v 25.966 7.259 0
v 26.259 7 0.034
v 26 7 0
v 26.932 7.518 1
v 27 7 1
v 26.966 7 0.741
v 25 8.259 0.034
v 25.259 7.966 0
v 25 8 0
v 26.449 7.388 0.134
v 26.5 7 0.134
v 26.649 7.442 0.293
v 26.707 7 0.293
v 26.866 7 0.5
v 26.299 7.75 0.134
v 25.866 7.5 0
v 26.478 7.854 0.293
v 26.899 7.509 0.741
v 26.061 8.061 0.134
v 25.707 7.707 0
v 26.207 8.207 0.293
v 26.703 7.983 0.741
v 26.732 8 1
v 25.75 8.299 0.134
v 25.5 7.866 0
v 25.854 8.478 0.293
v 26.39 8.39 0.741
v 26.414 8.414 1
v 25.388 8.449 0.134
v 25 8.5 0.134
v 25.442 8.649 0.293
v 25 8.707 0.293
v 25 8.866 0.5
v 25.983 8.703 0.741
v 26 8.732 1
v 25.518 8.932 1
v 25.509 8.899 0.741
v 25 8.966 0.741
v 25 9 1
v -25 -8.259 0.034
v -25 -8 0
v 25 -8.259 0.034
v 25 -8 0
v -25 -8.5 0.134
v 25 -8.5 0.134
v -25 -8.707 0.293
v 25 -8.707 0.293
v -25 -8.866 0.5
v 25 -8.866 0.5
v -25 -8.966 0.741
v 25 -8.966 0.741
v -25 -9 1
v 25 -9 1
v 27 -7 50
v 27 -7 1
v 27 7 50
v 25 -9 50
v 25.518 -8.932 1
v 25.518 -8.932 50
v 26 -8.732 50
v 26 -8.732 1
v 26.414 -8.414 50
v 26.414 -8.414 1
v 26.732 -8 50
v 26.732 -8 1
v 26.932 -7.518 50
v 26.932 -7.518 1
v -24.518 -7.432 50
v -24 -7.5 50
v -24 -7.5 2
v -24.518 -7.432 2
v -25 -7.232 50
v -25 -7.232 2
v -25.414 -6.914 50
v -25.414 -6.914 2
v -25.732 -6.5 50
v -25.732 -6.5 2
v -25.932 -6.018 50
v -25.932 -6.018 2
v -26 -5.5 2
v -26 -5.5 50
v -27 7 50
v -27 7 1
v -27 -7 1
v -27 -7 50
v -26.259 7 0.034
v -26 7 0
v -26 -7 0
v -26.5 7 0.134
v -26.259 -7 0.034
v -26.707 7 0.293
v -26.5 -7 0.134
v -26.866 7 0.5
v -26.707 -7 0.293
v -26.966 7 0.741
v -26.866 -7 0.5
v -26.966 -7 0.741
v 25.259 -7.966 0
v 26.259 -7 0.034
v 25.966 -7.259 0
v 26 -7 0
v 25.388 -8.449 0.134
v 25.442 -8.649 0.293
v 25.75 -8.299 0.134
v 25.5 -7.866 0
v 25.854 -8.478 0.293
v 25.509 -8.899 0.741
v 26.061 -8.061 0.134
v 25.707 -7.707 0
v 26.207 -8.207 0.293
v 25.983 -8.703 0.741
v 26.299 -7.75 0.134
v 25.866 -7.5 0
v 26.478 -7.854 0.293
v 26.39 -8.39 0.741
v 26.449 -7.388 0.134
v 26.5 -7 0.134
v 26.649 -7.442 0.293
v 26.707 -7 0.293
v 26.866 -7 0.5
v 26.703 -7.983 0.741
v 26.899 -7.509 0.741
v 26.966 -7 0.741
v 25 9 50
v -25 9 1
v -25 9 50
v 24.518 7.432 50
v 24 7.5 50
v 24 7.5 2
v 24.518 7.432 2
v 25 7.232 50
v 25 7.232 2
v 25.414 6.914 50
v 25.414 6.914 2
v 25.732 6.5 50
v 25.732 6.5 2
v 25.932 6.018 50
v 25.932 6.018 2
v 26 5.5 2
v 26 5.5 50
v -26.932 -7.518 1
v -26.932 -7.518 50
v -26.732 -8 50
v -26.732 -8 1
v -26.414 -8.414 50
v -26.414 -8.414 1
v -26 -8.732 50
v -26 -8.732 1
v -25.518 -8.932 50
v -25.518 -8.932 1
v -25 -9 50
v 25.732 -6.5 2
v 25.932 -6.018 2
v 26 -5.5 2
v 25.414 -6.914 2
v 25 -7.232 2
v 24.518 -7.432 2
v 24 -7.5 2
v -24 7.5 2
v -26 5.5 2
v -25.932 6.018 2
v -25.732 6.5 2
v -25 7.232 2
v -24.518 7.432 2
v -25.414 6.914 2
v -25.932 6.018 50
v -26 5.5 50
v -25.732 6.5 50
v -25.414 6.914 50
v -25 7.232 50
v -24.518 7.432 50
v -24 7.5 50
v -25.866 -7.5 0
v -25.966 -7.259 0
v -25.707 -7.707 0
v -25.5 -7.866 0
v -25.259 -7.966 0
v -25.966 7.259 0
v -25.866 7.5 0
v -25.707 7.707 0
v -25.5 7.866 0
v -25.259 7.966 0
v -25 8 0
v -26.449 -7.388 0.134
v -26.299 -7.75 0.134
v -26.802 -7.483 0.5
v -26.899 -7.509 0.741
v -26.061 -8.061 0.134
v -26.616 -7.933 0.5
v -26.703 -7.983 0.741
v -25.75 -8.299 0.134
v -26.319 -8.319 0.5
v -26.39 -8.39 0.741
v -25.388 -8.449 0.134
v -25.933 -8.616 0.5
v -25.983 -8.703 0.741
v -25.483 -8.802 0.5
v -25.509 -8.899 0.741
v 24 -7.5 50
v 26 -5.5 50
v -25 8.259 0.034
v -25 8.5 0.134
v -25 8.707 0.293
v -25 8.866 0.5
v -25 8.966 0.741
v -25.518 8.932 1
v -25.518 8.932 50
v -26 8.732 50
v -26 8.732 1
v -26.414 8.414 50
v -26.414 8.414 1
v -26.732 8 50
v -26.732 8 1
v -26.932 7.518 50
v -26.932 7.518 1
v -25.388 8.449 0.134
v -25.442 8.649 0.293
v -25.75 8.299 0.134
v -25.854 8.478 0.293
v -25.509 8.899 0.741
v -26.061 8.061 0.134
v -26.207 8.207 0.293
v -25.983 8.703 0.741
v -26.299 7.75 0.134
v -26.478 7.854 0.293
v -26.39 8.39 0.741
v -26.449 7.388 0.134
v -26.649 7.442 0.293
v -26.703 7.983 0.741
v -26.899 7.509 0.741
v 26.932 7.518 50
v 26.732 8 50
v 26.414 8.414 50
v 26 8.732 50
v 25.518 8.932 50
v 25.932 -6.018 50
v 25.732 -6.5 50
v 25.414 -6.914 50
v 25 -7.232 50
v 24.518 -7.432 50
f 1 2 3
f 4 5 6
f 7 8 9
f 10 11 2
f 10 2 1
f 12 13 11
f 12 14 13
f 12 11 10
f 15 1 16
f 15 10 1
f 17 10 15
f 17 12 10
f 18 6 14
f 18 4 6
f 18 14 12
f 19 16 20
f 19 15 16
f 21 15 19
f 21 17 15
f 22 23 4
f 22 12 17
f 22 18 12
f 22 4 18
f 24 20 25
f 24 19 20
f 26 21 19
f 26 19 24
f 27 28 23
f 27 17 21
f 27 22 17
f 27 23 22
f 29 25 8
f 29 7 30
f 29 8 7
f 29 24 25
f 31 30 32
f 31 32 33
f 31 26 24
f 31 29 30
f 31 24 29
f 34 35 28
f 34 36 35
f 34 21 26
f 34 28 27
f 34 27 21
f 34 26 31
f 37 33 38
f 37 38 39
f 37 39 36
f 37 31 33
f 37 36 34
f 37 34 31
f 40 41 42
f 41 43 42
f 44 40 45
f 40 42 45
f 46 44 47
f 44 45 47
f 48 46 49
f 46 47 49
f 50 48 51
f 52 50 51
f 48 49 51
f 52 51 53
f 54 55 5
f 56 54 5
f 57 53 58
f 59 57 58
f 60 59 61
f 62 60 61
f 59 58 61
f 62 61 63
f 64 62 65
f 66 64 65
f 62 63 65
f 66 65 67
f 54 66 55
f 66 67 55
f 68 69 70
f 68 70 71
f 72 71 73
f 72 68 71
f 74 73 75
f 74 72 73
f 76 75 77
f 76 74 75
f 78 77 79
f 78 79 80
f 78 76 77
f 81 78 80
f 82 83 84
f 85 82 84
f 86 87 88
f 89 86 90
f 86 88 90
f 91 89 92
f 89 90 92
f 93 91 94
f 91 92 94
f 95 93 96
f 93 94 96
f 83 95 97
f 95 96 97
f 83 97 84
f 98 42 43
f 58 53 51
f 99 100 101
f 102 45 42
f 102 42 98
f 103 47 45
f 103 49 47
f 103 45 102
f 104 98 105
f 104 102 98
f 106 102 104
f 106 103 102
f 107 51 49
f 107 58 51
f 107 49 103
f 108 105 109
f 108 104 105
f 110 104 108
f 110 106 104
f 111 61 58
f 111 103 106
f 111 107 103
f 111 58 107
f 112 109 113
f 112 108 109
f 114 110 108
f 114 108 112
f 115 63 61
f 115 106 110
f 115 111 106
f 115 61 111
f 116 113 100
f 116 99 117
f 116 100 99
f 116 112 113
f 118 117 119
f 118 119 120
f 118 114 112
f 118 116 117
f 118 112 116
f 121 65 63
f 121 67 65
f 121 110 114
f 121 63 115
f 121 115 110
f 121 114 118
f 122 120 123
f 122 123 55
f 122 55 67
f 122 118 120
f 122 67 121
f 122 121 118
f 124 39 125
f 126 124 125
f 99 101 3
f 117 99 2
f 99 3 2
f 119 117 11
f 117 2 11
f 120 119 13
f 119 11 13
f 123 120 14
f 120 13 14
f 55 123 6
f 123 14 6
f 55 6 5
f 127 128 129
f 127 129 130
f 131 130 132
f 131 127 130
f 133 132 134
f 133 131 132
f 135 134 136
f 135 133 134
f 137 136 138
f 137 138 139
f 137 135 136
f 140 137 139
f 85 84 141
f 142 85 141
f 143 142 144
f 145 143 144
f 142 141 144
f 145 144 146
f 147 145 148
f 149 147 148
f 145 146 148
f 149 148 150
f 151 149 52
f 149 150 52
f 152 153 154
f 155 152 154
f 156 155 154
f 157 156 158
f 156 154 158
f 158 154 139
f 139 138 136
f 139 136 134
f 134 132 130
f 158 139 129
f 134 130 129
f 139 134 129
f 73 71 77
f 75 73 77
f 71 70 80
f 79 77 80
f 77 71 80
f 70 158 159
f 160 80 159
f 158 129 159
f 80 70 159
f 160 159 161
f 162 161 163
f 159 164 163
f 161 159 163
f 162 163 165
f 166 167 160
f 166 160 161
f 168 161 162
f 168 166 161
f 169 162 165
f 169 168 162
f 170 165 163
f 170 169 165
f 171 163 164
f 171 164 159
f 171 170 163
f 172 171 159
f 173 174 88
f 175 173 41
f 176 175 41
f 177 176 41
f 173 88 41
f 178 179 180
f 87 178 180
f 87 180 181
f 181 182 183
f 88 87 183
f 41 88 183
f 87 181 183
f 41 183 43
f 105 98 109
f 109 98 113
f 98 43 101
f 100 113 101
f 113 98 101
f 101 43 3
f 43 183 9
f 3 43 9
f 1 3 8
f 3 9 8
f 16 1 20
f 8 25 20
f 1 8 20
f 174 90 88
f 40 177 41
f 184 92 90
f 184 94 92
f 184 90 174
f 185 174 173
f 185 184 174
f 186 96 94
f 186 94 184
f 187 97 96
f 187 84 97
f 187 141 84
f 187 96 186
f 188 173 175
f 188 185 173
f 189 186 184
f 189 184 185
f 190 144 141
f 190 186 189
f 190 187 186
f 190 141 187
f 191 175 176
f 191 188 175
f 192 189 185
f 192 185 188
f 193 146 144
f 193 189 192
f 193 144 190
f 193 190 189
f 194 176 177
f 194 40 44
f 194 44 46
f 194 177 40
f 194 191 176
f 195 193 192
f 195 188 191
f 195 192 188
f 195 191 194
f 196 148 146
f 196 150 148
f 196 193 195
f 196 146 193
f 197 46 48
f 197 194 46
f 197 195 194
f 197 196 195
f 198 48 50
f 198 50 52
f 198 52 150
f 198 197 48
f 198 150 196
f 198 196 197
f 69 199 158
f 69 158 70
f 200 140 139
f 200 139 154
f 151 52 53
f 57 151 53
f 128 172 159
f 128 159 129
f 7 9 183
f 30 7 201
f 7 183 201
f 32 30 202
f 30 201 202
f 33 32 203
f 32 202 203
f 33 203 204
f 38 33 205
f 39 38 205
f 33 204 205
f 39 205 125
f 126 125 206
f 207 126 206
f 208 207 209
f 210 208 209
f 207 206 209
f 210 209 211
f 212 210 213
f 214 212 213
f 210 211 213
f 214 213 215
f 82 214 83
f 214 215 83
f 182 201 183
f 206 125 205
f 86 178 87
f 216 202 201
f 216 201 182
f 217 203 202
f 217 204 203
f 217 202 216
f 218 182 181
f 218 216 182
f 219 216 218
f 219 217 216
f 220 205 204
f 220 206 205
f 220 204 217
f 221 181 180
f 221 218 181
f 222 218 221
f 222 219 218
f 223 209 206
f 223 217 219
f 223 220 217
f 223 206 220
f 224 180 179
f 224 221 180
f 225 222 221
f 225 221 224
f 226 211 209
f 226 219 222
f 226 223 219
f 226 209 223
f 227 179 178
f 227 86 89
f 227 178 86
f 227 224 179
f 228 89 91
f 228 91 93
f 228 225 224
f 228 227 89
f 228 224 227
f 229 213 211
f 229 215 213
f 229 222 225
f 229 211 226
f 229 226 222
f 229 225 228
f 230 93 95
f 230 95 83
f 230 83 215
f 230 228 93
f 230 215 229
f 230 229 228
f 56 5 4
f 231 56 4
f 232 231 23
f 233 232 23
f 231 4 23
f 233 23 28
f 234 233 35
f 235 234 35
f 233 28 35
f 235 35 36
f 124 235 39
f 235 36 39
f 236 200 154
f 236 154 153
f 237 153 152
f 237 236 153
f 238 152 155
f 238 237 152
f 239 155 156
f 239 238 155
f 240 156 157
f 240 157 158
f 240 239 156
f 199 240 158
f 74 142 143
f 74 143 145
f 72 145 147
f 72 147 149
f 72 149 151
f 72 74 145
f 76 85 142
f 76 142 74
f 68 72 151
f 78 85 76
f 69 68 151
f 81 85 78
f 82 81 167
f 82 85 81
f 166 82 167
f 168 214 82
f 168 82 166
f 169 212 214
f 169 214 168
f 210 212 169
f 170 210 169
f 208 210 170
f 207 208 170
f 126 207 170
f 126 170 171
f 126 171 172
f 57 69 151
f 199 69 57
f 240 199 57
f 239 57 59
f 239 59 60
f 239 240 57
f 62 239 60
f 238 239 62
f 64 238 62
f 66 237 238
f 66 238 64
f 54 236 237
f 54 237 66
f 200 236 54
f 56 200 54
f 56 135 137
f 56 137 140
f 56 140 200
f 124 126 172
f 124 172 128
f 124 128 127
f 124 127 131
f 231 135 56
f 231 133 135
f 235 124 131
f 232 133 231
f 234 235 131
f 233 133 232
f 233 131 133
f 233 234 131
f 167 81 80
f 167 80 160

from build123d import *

# Parameters (mm, degrees)
BOSS_EXTRUDE1_DEPTH = 50
CUT_EXTRUDE1_DEPTH  = 48
FILLET1_R           = 1


with BuildPart() as part:
    # Sketch1 → Boss-Extrude1 (new body)
    with BuildSketch(Plane.XY):
        with BuildLine():
            Line((25, 9), (-25, 9))
            ThreePointArc((-25, 9), (-26.414213562, 8.414213562), (-27, 7))
            Line((-27, 7), (-27, -7))
            ThreePointArc((-27, -7), (-26.414213562, -8.414213562), (-25, -9))
            Line((-25, -9), (25, -9))
            ThreePointArc((25, -9), (26.414213562, -8.414213562), (27, -7))
            Line((27, -7), (27, 7))
            ThreePointArc((27, 7), (26.414213562, 8.414213562), (25, 9))
        make_face()
    extrude(amount=BOSS_EXTRUDE1_DEPTH)

    # Sketch2 → Cut-Extrude1 (cut)
    with BuildSketch(Plane.XY.offset(50)):
        with BuildLine():
            Line((24, -7.5), (-24, -7.5))
            ThreePointArc((-24, -7.5), (-25.414213562, -6.914213562), (-26, -5.5))
            Line((-26, -5.5), (-26, 5.5))
            ThreePointArc((-26, 5.5), (-25.414213562, 6.914213562), (-24, 7.5))
            Line((-24, 7.5), (24, 7.5))
            ThreePointArc((24, 7.5), (25.414213562, 6.914213562), (26, 5.5))
            Line((26, 5.5), (26, -5.5))
            ThreePointArc((26, -5.5), (25.414213562, -6.914213562), (24, -7.5))
        make_face()
    extrude(amount=-CUT_EXTRUDE1_DEPTH, mode=Mode.SUBTRACT)

    # Fillet1
    fillet1_edges = [part.edges().sort_by_distance(p)[0] for p in [
        (0, -9, 0),
        (-26.414213562, -8.414213562, 0),
        (-27, 0, 0),
        (-26.414213562, 8.414213562, 0),
        (0, 9, 0),
        (26.414213562, 8.414213562, 0),
        (27, 0, 0),
        (26.414213562, -8.414213562, 0),
    ]]
    fillet(fillet1_edges, radius=FILLET1_R)


solid = part.part
